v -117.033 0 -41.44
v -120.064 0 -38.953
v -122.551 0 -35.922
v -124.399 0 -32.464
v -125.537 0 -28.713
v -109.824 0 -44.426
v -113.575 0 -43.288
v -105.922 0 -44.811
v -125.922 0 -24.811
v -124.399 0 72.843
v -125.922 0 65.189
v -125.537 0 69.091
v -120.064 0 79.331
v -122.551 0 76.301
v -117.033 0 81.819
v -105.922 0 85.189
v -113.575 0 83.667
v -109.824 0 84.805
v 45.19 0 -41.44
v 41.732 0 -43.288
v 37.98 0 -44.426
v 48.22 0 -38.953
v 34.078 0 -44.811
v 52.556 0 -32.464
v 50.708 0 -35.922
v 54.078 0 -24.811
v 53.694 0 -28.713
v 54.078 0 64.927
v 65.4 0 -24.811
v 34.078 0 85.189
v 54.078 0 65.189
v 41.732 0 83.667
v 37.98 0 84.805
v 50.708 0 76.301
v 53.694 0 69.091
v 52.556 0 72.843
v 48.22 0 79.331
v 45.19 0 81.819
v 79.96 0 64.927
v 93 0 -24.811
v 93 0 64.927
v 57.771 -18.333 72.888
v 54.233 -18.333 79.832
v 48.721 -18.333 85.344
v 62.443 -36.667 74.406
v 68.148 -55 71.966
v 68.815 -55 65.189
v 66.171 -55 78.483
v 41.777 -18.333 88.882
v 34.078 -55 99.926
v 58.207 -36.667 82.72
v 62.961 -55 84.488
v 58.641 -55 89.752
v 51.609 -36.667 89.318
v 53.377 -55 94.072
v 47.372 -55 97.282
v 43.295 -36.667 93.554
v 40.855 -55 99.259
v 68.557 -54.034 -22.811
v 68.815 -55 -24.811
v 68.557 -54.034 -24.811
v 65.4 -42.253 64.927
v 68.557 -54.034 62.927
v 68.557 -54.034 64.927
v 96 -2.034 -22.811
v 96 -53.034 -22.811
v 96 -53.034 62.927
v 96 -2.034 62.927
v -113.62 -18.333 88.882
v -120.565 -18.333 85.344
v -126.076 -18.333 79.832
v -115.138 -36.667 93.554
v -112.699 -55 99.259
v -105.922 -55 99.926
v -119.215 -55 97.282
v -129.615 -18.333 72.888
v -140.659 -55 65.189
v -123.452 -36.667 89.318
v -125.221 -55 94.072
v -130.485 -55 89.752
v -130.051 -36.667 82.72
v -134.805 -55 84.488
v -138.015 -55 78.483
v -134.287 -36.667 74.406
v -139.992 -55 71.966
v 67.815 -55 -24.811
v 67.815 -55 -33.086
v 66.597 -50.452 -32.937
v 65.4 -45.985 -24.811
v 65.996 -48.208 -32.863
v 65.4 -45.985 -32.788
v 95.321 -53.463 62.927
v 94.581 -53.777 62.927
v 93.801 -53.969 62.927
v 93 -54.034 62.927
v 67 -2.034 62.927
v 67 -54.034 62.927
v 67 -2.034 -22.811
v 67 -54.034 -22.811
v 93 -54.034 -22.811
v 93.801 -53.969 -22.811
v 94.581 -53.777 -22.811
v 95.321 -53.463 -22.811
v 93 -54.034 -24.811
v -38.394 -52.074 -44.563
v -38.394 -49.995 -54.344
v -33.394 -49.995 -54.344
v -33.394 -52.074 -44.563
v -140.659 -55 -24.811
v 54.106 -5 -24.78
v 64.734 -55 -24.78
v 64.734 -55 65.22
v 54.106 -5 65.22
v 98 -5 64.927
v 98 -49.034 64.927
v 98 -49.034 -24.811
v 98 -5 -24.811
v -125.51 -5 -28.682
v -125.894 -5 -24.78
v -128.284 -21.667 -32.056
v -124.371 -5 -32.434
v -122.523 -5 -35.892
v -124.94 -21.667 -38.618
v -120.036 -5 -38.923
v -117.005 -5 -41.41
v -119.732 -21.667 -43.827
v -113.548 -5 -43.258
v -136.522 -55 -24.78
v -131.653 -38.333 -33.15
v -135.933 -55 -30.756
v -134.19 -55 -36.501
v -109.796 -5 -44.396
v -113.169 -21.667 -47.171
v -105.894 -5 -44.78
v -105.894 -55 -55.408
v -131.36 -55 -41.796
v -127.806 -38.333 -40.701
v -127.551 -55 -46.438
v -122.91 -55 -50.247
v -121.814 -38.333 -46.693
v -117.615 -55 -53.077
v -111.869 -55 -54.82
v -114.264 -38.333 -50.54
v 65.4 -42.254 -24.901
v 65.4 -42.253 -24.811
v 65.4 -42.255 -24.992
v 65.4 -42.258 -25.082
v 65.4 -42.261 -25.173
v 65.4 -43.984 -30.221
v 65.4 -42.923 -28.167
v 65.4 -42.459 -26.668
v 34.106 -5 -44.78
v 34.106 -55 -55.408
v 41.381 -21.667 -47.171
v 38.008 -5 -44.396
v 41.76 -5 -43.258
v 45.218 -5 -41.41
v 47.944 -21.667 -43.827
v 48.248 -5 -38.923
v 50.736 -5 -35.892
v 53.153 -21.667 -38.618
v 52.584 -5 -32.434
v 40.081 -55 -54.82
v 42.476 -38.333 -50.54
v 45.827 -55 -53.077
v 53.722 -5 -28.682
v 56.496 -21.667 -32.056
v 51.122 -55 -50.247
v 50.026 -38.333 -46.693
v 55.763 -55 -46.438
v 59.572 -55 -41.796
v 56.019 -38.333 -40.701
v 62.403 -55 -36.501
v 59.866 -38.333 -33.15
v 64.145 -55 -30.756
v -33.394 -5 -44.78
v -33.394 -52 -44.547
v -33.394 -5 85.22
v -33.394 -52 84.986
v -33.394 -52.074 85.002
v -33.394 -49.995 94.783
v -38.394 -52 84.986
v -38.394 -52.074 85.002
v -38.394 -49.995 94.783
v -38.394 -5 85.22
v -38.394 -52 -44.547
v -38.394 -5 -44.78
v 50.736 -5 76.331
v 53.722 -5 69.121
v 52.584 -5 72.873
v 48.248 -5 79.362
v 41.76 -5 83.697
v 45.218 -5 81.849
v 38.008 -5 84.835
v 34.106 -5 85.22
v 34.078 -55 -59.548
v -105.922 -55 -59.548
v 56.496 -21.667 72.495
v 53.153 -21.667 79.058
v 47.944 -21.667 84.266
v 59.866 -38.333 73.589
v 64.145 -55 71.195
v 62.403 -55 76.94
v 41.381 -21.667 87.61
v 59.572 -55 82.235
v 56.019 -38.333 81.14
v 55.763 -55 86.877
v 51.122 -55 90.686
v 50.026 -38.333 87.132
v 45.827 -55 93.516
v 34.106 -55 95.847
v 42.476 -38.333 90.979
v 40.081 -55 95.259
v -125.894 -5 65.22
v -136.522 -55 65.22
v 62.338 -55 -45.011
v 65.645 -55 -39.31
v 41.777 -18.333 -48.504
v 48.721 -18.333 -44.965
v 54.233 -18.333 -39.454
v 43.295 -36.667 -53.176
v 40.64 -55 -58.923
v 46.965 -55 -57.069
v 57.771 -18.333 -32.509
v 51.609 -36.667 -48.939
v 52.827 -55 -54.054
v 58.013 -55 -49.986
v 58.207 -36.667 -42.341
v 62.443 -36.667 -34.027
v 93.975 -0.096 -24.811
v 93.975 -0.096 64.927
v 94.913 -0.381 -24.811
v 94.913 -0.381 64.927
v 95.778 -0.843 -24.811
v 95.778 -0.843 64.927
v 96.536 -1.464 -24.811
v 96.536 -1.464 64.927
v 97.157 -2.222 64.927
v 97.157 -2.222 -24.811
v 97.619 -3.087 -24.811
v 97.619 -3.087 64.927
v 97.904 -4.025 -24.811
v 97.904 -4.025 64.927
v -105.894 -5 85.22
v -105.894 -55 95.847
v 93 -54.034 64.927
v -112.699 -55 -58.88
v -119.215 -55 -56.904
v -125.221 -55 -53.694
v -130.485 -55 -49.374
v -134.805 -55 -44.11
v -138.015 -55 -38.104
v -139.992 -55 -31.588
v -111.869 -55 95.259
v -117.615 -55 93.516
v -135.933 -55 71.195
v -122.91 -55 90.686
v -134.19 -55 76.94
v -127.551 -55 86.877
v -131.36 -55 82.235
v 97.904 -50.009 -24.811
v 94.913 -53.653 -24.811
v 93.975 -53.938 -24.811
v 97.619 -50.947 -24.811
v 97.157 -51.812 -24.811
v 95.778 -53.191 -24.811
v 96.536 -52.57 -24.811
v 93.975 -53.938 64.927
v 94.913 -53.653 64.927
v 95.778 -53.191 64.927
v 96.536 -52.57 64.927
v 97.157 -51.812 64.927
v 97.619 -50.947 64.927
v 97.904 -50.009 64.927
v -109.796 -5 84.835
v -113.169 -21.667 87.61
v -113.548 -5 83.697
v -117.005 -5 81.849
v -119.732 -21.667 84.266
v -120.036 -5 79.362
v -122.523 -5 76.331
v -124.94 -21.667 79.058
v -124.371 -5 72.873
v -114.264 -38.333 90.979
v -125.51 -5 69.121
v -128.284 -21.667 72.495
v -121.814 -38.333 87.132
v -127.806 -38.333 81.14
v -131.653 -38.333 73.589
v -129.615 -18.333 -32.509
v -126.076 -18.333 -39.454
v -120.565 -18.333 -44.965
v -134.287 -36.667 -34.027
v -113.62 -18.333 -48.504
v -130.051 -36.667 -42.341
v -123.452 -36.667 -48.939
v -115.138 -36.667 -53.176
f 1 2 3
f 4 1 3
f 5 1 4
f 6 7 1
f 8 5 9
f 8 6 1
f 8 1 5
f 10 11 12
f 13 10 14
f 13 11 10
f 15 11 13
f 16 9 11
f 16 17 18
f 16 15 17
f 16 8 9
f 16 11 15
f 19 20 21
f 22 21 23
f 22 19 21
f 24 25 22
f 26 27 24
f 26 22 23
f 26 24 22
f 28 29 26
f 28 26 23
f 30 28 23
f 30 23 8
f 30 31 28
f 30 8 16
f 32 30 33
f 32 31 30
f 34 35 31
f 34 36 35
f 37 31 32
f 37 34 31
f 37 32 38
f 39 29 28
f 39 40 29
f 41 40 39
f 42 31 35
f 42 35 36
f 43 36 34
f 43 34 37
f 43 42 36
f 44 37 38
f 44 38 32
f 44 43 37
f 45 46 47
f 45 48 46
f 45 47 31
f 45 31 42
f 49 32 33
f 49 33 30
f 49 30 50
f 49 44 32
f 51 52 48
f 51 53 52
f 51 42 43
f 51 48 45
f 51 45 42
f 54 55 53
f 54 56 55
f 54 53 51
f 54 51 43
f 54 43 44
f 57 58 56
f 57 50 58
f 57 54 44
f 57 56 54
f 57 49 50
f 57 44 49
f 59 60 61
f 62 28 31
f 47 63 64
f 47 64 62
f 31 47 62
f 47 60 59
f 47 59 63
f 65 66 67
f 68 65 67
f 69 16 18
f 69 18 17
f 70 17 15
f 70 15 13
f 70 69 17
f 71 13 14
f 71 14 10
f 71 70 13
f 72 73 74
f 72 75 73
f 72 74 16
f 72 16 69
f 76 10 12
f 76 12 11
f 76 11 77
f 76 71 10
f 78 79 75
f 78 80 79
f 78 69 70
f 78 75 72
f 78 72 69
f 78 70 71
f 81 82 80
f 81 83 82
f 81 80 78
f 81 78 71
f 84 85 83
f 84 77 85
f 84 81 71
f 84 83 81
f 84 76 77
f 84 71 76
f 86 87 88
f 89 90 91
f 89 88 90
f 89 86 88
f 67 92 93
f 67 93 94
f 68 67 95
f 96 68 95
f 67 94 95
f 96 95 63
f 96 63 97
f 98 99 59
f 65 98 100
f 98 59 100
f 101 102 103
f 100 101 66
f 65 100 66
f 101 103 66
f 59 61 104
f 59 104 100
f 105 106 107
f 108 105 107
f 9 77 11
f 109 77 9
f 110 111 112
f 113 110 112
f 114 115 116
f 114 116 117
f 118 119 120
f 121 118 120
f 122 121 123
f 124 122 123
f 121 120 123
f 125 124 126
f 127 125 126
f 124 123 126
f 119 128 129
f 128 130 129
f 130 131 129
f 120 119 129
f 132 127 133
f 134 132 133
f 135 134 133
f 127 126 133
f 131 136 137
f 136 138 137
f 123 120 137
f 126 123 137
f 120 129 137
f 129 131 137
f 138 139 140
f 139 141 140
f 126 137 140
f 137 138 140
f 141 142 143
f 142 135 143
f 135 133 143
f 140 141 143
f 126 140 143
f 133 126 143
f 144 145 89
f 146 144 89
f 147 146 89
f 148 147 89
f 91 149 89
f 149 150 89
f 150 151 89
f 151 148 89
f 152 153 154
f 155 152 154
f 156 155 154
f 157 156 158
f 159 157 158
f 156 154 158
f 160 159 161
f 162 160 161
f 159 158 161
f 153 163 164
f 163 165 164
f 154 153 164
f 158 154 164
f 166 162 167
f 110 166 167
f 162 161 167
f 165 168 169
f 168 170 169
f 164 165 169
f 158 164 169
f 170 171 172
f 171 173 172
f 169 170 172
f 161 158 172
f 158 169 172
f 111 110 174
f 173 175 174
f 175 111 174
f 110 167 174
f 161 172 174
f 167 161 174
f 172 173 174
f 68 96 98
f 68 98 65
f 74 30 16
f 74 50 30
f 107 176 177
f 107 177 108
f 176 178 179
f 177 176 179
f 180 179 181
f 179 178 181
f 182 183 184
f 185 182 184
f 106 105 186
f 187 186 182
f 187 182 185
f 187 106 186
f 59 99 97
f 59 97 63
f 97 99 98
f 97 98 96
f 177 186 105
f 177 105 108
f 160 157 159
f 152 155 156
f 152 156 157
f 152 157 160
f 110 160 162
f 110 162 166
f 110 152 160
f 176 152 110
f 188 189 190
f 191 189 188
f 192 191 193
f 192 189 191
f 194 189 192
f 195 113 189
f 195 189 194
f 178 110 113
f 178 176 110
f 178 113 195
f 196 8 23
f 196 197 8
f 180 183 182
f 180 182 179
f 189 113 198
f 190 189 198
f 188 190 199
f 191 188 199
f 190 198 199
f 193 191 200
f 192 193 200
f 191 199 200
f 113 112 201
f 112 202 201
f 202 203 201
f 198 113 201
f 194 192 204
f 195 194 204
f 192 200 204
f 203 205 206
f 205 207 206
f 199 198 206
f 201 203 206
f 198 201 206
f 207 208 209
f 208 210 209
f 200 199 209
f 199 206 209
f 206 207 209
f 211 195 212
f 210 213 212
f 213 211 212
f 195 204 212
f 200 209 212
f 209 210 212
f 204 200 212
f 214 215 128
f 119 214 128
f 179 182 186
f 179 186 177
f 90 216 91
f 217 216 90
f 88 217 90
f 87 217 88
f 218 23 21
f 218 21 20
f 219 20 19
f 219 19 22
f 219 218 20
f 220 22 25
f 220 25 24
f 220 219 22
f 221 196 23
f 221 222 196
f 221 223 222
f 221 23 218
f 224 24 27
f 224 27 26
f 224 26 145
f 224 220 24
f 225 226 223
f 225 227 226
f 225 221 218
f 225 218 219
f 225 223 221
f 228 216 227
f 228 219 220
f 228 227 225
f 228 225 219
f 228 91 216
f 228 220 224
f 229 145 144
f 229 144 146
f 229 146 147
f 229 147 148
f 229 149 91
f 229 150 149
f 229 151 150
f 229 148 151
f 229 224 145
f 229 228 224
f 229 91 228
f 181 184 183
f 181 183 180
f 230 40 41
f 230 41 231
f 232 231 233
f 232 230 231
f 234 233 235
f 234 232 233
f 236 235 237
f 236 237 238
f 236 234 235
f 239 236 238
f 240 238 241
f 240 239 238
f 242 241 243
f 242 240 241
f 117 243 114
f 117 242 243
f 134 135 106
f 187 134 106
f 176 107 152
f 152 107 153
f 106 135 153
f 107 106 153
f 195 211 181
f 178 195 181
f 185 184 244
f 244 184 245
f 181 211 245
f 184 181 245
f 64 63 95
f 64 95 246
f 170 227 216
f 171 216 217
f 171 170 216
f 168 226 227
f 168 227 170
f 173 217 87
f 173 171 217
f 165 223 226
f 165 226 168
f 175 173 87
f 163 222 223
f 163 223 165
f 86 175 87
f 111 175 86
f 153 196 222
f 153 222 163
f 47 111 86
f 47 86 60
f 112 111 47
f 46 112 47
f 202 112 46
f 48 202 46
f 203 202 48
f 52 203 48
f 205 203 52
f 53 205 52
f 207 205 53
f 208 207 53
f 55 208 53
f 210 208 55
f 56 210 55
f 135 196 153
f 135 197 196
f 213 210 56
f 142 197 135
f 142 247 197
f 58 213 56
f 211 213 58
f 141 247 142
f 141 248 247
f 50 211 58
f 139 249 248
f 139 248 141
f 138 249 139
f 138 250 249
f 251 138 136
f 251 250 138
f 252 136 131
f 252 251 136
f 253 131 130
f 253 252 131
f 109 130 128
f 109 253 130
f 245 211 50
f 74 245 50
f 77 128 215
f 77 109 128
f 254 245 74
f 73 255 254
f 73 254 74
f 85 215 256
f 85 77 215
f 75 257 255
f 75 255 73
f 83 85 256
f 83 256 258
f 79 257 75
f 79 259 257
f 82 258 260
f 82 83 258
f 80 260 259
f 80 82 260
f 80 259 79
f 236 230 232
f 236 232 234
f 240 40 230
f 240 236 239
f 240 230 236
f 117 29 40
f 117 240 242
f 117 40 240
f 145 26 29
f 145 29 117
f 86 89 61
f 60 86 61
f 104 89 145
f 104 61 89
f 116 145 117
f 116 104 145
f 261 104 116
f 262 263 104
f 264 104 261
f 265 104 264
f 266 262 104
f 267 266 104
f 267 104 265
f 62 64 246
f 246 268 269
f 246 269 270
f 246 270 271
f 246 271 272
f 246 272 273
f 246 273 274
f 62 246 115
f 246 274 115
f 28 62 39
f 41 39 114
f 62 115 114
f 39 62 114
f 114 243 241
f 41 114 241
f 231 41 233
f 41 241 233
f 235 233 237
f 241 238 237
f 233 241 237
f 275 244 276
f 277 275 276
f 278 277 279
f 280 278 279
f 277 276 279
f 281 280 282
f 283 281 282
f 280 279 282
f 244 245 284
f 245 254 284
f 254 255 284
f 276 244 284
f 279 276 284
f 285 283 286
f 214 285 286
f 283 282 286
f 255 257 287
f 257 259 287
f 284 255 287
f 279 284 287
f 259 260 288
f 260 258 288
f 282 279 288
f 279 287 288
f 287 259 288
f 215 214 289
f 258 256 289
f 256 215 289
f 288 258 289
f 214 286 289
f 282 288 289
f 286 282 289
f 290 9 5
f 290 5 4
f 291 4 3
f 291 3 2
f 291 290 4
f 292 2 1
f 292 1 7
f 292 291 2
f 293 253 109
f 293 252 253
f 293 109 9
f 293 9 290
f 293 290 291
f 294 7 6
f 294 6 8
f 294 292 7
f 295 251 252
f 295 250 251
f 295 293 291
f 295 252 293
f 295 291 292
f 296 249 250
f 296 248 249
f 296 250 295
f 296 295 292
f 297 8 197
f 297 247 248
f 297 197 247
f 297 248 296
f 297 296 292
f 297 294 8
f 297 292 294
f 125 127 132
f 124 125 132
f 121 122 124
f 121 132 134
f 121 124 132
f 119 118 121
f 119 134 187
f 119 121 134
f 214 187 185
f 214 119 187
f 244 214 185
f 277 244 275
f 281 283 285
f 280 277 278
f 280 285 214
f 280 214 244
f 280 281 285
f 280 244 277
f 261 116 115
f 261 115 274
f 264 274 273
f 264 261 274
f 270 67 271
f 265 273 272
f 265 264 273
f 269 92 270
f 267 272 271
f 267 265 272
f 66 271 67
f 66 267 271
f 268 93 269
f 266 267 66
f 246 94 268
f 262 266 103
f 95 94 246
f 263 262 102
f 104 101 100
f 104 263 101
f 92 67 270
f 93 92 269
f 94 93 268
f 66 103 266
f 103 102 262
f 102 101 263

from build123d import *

# Parameters (mm, degrees)
F1_DEPTH     = 55
F1_TAPER     = -15
F4_DEPTH     = 55
F4_TAPER     = -12
F5_W         = 5
F5_H         = 130
F6_DEPTH     = 47
F10_W        = 360.01701653
F10_H        = 225.87454319
F11_DEPTH    = 25
F12_W        = 5
F12_H        = 46
F13_DEPTH    = 10
F14_W        = 5
F14_H        = 46
F15_DEPTH    = 10
F8_W         = 54.0339685977
F8_H         = 90.1
F16_DEPTH    = 32.6
F9_W         = 55.9400806222
F9_H         = 89.7377200425
F17_DEPTH    = 25
F18_W        = 347.7291613817
F18_H        = 217.2330617905
F19_DEPTH    = 25
F20_W        = 34.4053636551
F20_H        = 45.9854951713
F21_DEPTH    = 25
F22_W        = 1.5565819549
F22_H        = 85.7377200425
F22_W_2      = 27.4434180451
F23_DEPTH    = 52
F24_T1_DEPTH = 114.7377200425


# Not quite as in the source:
# - a fillet or chamfer that OpenCascade refuses, or shapes differently, is made with other operations: its cross-section is extruded or revolved along the edge and cut away or added


with BuildPart() as f1:
    # F0 (on Front) → F1 (new body)
    with BuildSketch(Plane.XZ):
        with BuildLine():
            Line((34.0782237053, 85.1892769337), (-105.9217762947, 85.1892769337))
            ThreePointArc((-105.9217762947, 85.1892769337), (-120.0639119184, 79.3314125574), (-125.9217762947, 65.1892769337))
            Line((-125.9217762947, 65.1892769337), (-125.9217762947, -24.8107230663))
            ThreePointArc((-125.9217762947, -24.8107230663), (-120.0639119184, -38.9528586901), (-105.9217762947, -44.8107230663))
            Line((-105.9217762947, -44.8107230663), (34.0782237053, -44.8107230663))
            ThreePointArc((34.0782237053, -44.8107230663), (48.220359329, -38.9528586901), (54.0782237053, -24.8107230663))
            Line((54.0782237053, -24.8107230663), (54.0782237053, 65.1892769337))
            ThreePointArc((54.0782237053, 65.1892769337), (48.220359329, 79.3314125574), (34.0782237053, 85.1892769337))
        make_face()
    extrude(amount=F1_DEPTH, taper=F1_TAPER)

    # F3 (on offset) → F4 (cut)
    with BuildSketch(Plane.XZ.offset(5)):
        with BuildLine():
            Line((34.106137666, 85.2195297501), (-105.893862334, 85.2195297501))
            ThreePointArc((-105.893862334, 85.2195297501), (-120.0359979577, 79.3616653739), (-125.893862334, 65.2195297501))
            Line((-125.893862334, 65.2195297501), (-125.893862334, -24.7804702499))
            ThreePointArc((-125.893862334, -24.7804702499), (-120.0359979577, -38.9226058736), (-105.893862334, -44.7804702499))
            Line((-105.893862334, -44.7804702499), (34.106137666, -44.7804702499))
            ThreePointArc((34.106137666, -44.7804702499), (48.2482732898, -38.9226058736), (54.106137666, -24.7804702499))
            Line((54.106137666, -24.7804702499), (54.106137666, 65.2195297501))
            ThreePointArc((54.106137666, 65.2195297501), (48.2482732898, 79.3616653739), (34.106137666, 85.2195297501))
        make_face()
    extrude(amount=F4_DEPTH, taper=F4_TAPER, mode=Mode.SUBTRACT)

    # F5 (on face) → F6 (join)
    with BuildSketch(Plane.XZ.offset(5)):
        with Locations((-35.893862334, 20.2195297501)):
            Rectangle(F5_W, F5_H)
    extrude(amount=F6_DEPTH)

    # F10 (on Front) → F11 (cut)
    with BuildSketch(Plane.XZ):
        with Locations((5.3876563907, 10.9746605158)):
            Rectangle(F10_W, F10_H)
    extrude(amount=-F11_DEPTH, mode=Mode.SUBTRACT)

    # F12 (on face) → F13 (join)
    with BuildSketch(Plane(origin=(0, 8.8907927165, -41.8278911112), x_dir=(1, 0, 0), z_dir=(0, -0.2079116908, 0.9781476007))):
        with Locations((-35.893862334, -37.2011212889)):
            Rectangle(F12_W, F12_H)
    extrude(amount=F13_DEPTH)

    # F14 (on face) → F15 (join)
    with BuildSketch(Plane(origin=(0, 17.1148163716, 80.5188804202), x_dir=(1, 0, 0), z_dir=(0, -0.2079116908, -0.9781476007))):
        with Locations((-35.893862334, 45.6088745247)):
            Rectangle(F14_W, F14_H)
    extrude(amount=F15_DEPTH)

    # F8 (on offset) → F16 (join)
    with BuildSketch(Plane.YZ.offset(98)):
        with Locations((-27.0169842988, 19.8769969761)):
            Rectangle(F8_W, F8_H)
    extrude(amount=-F16_DEPTH)

    # F9 (on face) → F17 (join)
    with BuildSketch(Plane(origin=(50.4556696128, 13.5195559263, 0), x_dir=(-0.2588190451, 0.9659258263, 0), z_dir=(0.9659258263, 0.2588190451, 0))):
        with Locations((-41.9665145313, 20.0581369549)):
            Rectangle(F9_W, F9_H)
    extrude(amount=F17_DEPTH)

    # F18 (on Front) → F19 (cut)
    with BuildSketch(Plane.XZ):
        with Locations((0.111065805, 20.1892703772)):
            Rectangle(F18_W, F18_H)
    extrude(amount=-F19_DEPTH, mode=Mode.SUBTRACT)

    # F20 (on face) → F21 (cut)
    with BuildSketch(Plane(origin=(0, 0, -24.8107230663), x_dir=(1, 0, 0), z_dir=(0, 0, -1))):
        Polygon((68.0166854944, 55.7510983837), (65.4, 45.9854951713), (99.8053636551, 45.9854951713), (100.283839941, 55.7510983837), align=None)
        with Locations((82.6026818275, 22.9927475857)):
            Rectangle(F20_W, F20_H)
    extrude(amount=F21_DEPTH, mode=Mode.SUBTRACT)

    # F22 (on face) → F23 (cut)
    with BuildSketch(Plane.XZ.offset(54.0339685977)):
        with Locations((67.7782909774, 20.0581369549)):
            Rectangle(F22_W, F22_H)
        with Locations((82.2782909774, 20.0581369549)):
            Rectangle(F22_W_2, F22_H)
    extrude(amount=-F23_DEPTH, mode=Mode.SUBTRACT)

    # F24: fillet of radius 5 on 2 edges, made by hand

    # F24_s2 → F24_t1 (cut)
    with BuildSketch(Plane.XY.offset(-37.3107230663)):
        with BuildLine():
            ThreePointArc((98, -49.0339685977), (96.5355339059, -52.5695025036), (93, -54.0339685977))
            Line((93, -54.0339685977), (98, -54.0339685977))
            Line((98, -54.0339685977), (98, -49.0339685977))
        make_face()
        with BuildLine():
            ThreePointArc((93, 0), (96.5355339059, -1.4644660941), (98, -5))
            Line((98, -5), (98, 0))
            Line((98, 0), (93, 0))
        make_face()
    extrude(amount=F24_T1_DEPTH, mode=Mode.SUBTRACT)


solid = f1.part
